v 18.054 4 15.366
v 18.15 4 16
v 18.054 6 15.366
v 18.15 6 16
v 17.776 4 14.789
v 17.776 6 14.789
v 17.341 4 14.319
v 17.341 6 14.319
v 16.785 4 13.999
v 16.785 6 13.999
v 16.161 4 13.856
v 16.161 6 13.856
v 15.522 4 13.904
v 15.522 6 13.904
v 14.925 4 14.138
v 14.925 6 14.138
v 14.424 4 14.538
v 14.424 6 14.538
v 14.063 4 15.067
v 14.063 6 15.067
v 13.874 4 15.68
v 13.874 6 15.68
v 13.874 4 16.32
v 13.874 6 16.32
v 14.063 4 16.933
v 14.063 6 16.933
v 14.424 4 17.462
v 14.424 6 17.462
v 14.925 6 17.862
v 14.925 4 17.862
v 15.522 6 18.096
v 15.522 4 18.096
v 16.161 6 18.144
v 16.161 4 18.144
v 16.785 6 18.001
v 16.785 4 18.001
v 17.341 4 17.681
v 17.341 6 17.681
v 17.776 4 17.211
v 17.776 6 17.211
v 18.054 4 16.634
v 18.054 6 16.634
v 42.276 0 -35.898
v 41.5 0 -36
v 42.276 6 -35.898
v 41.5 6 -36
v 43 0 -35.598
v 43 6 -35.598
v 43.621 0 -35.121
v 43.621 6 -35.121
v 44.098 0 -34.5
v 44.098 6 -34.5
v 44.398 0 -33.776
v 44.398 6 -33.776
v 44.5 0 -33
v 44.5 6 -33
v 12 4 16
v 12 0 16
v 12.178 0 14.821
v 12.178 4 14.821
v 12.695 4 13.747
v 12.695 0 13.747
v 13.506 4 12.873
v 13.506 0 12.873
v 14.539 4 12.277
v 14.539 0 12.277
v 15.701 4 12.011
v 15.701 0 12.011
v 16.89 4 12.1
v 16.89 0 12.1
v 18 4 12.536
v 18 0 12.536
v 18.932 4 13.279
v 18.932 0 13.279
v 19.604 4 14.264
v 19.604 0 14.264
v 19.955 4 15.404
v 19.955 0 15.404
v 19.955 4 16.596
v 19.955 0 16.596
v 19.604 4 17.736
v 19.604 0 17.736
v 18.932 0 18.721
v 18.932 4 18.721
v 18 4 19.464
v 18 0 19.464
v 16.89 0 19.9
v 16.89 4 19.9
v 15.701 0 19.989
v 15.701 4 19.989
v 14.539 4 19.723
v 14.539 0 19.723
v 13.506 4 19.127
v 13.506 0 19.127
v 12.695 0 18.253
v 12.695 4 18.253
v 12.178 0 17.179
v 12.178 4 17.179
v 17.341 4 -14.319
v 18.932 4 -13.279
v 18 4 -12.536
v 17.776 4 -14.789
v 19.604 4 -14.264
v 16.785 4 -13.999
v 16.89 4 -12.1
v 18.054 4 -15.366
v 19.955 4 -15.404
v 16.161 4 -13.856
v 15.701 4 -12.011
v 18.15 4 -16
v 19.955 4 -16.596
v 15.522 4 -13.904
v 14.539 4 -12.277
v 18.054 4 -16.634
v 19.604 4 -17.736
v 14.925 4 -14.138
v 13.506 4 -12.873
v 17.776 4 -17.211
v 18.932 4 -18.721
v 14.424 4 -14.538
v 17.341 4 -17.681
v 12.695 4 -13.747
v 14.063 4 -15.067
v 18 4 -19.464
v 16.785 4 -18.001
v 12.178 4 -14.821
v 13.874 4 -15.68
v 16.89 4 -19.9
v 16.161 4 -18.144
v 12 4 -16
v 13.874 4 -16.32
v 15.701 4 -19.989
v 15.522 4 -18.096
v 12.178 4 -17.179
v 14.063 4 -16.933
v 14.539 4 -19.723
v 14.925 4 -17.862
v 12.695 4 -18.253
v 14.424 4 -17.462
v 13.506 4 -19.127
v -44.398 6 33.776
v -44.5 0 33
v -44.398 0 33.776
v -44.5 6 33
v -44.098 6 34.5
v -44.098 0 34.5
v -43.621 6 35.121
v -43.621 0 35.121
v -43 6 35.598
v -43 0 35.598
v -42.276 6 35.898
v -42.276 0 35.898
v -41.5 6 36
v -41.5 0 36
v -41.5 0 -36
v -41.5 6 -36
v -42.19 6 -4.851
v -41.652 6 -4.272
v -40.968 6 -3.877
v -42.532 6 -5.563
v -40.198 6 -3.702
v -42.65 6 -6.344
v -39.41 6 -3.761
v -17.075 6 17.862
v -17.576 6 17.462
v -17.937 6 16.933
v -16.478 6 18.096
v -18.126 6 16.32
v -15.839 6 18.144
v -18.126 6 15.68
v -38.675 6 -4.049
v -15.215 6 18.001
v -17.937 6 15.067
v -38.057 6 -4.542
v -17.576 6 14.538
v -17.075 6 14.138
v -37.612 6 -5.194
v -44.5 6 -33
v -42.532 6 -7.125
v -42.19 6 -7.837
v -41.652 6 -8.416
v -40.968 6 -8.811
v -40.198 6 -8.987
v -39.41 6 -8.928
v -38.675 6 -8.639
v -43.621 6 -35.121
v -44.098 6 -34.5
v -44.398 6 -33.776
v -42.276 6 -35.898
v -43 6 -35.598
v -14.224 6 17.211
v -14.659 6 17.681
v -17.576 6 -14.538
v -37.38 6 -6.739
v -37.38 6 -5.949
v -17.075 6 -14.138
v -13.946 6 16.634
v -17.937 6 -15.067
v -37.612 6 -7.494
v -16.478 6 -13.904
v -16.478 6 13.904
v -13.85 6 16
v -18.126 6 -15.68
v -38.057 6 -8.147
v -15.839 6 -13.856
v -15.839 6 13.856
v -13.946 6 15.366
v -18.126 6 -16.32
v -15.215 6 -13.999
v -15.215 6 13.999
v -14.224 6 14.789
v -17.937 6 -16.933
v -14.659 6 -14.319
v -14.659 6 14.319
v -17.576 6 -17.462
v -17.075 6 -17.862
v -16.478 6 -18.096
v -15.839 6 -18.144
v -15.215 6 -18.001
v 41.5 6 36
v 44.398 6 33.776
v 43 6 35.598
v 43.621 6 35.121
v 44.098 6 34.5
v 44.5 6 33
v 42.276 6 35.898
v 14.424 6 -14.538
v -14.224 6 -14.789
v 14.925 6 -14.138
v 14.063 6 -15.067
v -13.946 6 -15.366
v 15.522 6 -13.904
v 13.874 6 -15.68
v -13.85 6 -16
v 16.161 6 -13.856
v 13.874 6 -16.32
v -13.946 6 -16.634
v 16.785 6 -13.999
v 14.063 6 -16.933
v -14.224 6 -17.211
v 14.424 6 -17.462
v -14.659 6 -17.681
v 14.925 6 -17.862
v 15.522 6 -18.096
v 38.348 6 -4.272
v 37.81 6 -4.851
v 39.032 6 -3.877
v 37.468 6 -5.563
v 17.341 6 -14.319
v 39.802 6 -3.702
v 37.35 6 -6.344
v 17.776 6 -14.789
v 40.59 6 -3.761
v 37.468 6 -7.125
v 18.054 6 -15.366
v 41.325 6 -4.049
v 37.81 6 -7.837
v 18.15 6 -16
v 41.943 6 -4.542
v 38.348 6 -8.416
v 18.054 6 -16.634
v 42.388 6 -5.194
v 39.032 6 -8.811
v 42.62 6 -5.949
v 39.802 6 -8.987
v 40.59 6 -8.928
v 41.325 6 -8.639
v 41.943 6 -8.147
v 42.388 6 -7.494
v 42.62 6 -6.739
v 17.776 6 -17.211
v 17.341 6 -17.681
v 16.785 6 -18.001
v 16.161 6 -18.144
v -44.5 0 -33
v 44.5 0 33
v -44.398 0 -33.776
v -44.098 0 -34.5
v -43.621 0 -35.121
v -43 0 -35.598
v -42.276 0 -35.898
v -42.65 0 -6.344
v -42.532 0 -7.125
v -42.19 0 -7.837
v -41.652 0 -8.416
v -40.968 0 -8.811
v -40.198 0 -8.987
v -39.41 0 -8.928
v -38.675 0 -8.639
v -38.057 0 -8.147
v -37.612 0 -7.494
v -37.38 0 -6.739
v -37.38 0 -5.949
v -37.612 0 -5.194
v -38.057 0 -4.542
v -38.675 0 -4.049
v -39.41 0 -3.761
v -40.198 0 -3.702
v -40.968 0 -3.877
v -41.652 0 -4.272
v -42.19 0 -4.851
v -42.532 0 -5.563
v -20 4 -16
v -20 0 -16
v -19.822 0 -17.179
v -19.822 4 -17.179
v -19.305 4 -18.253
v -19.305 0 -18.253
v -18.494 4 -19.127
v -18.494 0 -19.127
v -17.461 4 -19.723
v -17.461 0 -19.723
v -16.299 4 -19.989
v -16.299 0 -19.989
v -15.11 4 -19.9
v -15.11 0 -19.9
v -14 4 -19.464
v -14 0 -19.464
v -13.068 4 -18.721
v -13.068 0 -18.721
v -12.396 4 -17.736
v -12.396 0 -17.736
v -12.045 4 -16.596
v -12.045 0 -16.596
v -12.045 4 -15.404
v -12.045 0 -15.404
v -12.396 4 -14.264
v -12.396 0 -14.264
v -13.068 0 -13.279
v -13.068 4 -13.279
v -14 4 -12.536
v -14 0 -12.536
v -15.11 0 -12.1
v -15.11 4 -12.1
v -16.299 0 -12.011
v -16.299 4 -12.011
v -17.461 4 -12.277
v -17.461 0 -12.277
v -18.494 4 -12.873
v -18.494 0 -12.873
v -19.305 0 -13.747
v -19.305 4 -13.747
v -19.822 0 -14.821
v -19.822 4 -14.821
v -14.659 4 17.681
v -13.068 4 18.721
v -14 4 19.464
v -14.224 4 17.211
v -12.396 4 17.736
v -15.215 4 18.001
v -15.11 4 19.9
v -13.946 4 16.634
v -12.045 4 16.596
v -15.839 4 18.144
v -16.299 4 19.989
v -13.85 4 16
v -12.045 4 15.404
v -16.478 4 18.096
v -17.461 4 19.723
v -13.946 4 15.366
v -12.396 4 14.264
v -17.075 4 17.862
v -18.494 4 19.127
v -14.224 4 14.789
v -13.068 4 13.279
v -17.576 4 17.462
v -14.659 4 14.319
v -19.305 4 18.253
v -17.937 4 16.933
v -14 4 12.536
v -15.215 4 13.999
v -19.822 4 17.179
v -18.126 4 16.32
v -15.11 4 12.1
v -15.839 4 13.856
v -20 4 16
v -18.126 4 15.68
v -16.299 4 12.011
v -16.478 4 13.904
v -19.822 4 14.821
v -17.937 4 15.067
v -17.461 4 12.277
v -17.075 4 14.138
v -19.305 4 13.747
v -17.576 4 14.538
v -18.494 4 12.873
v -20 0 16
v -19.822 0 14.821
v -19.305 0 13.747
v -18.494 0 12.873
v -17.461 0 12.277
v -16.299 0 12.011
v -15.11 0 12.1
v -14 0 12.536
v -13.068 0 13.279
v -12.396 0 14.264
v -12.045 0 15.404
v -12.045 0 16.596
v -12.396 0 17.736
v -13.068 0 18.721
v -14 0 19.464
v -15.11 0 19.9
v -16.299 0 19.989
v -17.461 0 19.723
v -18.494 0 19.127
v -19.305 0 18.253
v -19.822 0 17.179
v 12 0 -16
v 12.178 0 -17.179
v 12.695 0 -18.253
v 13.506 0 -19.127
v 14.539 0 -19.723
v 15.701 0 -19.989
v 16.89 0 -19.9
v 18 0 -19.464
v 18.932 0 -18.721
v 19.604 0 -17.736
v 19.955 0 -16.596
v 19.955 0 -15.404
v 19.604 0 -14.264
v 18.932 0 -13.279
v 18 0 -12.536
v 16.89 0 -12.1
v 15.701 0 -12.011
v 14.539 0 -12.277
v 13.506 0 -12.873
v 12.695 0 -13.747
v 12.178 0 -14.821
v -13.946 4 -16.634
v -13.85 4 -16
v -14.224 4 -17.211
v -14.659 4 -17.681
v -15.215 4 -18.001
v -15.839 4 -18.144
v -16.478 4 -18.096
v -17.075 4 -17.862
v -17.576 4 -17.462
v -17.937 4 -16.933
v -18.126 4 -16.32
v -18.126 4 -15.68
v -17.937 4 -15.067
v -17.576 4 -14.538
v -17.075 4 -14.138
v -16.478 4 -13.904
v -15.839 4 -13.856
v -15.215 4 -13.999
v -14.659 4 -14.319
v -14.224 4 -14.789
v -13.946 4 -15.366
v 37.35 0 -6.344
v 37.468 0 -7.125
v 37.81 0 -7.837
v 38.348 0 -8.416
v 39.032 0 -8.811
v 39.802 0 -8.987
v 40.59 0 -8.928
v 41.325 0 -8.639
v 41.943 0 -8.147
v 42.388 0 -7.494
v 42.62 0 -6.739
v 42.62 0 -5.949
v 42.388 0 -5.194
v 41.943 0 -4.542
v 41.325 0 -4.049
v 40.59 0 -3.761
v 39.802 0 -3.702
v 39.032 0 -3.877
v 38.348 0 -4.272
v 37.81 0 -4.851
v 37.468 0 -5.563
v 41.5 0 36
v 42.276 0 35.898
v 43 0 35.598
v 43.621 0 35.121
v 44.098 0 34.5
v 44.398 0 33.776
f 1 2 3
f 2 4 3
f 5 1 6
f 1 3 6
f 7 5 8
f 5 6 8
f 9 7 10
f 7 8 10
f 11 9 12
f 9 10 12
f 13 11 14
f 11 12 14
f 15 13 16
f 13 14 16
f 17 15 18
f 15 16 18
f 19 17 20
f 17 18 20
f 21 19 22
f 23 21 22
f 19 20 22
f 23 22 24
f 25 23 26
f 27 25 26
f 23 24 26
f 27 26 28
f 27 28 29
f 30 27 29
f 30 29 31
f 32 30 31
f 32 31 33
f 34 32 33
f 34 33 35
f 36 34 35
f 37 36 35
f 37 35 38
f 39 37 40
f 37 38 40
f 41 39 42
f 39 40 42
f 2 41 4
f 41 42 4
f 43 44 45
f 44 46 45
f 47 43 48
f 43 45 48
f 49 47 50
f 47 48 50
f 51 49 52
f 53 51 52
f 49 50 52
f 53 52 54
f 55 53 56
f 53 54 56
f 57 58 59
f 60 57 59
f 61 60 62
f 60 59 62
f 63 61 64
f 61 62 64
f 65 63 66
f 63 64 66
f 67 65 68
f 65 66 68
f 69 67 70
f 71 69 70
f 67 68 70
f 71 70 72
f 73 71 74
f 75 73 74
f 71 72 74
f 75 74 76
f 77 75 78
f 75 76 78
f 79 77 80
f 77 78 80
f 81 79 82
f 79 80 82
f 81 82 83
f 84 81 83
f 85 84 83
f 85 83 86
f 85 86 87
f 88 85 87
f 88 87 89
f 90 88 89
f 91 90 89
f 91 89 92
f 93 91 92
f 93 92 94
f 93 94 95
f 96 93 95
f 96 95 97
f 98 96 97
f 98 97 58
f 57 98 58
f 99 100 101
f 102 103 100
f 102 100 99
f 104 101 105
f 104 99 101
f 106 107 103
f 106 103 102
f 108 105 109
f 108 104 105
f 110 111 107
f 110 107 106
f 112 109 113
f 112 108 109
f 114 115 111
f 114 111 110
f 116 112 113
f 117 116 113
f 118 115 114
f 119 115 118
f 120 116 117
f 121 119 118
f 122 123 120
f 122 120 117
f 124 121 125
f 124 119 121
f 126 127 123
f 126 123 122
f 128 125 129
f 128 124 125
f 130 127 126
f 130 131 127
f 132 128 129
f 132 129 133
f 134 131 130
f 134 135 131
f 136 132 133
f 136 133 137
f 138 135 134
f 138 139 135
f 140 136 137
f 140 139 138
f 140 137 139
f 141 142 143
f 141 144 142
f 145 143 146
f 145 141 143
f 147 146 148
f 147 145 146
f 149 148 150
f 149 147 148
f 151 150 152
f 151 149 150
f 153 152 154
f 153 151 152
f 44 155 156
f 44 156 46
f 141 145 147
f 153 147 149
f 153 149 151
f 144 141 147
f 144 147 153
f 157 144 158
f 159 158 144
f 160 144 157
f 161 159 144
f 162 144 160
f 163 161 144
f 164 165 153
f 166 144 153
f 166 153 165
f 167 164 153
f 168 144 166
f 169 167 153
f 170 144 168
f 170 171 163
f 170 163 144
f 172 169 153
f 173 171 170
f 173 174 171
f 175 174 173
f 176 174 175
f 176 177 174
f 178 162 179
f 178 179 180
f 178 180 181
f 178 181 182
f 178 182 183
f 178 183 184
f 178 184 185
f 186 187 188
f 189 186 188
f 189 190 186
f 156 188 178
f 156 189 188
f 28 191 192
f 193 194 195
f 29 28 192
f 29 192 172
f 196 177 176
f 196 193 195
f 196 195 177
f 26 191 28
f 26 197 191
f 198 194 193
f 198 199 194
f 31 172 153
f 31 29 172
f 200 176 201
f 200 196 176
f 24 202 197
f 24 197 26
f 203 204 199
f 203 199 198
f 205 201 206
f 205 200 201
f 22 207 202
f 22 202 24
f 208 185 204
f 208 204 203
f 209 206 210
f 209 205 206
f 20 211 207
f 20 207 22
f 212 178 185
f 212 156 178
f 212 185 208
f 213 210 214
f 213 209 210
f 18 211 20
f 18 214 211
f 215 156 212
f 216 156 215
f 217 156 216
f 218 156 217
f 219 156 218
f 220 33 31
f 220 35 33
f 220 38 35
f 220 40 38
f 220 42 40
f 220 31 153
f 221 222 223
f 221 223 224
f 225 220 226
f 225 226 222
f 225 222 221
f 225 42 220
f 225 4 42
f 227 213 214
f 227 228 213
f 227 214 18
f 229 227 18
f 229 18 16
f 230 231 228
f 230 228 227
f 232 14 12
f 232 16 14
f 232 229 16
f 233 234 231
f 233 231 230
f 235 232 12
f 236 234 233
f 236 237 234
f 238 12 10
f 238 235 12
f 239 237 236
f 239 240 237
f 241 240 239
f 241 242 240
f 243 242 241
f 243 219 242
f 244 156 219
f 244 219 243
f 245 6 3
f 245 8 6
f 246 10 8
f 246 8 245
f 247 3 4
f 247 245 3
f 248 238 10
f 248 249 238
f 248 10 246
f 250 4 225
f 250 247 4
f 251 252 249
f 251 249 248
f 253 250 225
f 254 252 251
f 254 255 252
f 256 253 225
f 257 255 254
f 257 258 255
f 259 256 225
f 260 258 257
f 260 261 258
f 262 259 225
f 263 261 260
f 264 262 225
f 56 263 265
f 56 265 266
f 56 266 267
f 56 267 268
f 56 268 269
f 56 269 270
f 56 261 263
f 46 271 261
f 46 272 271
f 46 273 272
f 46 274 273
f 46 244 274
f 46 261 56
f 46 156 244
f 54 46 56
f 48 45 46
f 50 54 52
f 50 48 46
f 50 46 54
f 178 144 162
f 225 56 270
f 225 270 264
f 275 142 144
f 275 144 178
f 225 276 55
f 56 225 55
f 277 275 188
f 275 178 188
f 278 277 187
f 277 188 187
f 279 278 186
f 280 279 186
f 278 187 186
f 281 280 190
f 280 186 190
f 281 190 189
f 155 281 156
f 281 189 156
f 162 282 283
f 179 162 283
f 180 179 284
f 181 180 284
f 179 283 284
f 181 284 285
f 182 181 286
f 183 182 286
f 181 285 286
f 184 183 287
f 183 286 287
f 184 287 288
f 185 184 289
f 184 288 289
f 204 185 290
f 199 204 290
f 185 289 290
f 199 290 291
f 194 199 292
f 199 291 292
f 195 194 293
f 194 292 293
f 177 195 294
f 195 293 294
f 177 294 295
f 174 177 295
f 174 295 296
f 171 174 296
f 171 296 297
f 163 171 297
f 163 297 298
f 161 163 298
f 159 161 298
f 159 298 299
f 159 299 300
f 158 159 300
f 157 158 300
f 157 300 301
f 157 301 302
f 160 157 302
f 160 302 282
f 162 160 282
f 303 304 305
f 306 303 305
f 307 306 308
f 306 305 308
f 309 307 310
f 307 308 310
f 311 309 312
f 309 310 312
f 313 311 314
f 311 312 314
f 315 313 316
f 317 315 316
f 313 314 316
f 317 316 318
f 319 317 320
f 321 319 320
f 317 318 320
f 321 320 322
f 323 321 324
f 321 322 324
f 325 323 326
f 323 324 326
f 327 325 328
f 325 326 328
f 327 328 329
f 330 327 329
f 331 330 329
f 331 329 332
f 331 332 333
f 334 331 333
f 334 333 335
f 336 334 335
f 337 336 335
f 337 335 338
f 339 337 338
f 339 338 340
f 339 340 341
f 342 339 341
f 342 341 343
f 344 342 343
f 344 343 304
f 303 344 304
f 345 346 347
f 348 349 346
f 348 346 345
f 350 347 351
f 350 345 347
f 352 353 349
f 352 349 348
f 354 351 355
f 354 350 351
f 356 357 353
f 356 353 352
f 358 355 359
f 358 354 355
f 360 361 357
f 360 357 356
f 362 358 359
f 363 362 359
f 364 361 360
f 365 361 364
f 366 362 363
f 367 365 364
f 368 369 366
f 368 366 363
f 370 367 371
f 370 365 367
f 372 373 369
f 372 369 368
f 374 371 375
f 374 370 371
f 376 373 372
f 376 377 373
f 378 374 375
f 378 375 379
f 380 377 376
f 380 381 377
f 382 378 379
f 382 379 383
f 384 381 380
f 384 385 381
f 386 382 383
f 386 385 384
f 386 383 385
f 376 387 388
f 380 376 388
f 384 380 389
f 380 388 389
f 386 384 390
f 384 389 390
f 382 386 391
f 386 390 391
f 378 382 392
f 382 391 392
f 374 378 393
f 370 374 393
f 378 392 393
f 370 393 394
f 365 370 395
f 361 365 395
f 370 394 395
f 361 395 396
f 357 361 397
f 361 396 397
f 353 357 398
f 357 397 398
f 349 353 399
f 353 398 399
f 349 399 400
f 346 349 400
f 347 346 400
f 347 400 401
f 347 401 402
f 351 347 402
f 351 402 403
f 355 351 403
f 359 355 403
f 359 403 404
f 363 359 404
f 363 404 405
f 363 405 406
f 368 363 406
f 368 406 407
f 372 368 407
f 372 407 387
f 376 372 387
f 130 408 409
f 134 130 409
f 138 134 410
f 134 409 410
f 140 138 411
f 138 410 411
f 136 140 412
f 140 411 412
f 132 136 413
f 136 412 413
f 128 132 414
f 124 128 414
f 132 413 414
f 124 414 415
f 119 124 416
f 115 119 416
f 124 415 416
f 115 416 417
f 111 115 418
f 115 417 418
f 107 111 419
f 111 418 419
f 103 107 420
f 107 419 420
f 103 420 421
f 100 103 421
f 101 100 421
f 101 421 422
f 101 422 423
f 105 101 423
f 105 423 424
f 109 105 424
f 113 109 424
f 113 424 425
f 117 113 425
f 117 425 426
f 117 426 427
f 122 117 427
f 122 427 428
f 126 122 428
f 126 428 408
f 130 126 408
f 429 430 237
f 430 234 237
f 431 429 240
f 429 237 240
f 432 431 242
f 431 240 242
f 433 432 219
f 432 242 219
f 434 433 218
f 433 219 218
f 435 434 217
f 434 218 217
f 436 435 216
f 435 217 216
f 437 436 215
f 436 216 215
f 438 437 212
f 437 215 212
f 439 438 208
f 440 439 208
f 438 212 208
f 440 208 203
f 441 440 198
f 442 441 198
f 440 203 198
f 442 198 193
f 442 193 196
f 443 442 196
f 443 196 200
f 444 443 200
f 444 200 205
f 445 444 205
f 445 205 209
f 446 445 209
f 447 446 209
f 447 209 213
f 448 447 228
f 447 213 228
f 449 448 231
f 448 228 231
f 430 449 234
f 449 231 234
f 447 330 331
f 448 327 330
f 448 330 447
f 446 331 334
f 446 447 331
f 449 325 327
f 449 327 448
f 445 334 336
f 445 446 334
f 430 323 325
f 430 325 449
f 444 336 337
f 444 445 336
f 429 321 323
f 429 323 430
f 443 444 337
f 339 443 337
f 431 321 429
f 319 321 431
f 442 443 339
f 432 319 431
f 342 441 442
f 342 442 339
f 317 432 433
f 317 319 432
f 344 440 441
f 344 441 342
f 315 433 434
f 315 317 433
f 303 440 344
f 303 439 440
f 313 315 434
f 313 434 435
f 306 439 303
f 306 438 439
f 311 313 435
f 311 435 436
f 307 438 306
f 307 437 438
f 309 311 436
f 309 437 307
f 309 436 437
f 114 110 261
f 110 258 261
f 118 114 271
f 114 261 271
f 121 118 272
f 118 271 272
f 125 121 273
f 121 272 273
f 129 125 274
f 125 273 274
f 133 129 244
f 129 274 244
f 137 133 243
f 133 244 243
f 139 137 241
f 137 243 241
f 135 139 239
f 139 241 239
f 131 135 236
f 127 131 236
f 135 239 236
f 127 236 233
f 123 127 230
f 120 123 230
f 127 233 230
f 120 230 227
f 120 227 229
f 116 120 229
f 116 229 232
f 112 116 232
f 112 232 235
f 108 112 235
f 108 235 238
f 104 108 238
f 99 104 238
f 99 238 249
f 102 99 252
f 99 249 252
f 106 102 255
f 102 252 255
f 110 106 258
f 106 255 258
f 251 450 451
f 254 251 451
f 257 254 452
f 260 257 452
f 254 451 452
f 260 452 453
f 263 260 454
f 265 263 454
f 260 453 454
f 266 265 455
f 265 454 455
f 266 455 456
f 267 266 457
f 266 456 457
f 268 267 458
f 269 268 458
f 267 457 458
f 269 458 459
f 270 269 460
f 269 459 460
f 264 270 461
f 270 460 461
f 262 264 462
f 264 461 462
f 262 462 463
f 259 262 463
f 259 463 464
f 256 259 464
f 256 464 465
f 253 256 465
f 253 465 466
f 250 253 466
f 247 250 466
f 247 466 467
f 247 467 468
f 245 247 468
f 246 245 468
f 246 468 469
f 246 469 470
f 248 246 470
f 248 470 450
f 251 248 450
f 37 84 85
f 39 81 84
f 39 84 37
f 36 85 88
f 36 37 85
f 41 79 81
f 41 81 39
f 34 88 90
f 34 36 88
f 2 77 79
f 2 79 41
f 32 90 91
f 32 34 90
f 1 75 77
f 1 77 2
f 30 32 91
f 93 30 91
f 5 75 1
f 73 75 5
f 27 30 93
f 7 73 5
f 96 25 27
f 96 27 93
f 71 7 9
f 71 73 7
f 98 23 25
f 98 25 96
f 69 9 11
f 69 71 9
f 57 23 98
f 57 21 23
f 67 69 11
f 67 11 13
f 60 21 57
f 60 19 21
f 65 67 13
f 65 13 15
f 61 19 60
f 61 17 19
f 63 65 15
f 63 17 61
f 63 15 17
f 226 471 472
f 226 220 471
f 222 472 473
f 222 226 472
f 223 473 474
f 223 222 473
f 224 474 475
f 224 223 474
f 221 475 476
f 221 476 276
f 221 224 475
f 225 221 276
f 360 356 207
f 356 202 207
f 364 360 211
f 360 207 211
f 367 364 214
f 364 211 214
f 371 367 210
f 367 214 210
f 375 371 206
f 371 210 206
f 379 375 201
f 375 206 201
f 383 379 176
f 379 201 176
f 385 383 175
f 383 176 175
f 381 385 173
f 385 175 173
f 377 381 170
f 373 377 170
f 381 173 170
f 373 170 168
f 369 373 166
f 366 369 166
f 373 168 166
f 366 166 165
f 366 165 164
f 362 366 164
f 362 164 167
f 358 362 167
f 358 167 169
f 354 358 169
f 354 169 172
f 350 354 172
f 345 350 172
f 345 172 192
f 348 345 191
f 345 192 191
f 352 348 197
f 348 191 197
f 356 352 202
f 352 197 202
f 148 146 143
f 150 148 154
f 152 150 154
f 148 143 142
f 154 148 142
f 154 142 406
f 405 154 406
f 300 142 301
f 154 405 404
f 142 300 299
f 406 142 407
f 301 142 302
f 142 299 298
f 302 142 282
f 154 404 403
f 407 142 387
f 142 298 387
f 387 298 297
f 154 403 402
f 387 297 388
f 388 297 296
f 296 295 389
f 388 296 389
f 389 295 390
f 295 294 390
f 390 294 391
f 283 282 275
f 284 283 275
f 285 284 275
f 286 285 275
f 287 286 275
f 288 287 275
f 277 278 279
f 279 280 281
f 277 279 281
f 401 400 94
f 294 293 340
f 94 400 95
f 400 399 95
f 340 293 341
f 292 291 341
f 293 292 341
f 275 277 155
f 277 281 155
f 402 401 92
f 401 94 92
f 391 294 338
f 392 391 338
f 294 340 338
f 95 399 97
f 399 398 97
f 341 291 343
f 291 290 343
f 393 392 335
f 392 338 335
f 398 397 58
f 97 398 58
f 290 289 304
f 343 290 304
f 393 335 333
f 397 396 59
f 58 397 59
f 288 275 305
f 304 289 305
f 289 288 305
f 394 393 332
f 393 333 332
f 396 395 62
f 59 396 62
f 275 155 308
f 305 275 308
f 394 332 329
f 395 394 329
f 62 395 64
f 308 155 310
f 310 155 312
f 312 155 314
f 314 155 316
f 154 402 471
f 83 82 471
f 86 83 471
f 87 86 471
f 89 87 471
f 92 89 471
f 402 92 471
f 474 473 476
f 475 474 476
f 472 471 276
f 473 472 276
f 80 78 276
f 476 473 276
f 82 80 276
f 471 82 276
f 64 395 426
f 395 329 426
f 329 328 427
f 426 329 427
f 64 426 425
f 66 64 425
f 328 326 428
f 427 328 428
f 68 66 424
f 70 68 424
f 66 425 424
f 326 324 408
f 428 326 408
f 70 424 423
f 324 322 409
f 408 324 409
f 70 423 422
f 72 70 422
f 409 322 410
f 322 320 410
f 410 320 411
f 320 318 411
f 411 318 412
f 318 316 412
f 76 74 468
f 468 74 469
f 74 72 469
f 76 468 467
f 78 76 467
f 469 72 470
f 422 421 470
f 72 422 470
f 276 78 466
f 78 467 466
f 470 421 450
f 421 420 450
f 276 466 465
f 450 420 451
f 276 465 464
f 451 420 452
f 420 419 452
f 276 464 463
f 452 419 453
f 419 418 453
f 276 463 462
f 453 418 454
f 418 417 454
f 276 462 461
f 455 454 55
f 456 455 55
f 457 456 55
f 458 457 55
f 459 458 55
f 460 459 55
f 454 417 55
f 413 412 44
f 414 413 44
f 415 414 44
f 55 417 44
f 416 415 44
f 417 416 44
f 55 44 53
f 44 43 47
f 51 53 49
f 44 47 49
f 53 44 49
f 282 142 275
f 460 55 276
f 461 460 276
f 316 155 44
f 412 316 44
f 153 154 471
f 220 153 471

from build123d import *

# Parameters (mm, degrees)
SKETCH2_W                      = 89
SKETCH2_H                      = 72
BOSS_EXTRUDE1_DEPTH            = 6
CBORE_FOR_M4_SHCS1_D           = 4.3
CBORE_FOR_M4_SHCS1_CBORE_D     = 8
CBORE_FOR_M4_SHCS1_CBORE_DEPTH = 4
M5_CLEARANCE_HOLE1_D           = 5.3
FILLET1_R                      = 3


with BuildPart() as part:
    # Sketch2 → Boss-Extrude1 (new body)
    with BuildSketch(Plane(origin=(0, 0, 0), x_dir=(1, 0, 0), z_dir=(0, 1, 0))):
        Rectangle(SKETCH2_W, SKETCH2_H)
    extrude(amount=BOSS_EXTRUDE1_DEPTH)

    # CBORE for M4 SHCS1 (through all)
    with Locations(Plane(origin=(0, 0, 0), x_dir=(-1, 0, 0), z_dir=(0, -1, 0))):
        with Locations((-16, -16), (-16, 16), (16, 16), (16, -16)):
            CounterBoreHole(CBORE_FOR_M4_SHCS1_D / 2, CBORE_FOR_M4_SHCS1_CBORE_D / 2, CBORE_FOR_M4_SHCS1_CBORE_DEPTH)

    # M5 Clearance Hole1 (through all)
    with Locations(Plane(origin=(0, 6, 0), x_dir=(1, 0, 0), z_dir=(0, 1, 0))):
        with Locations((-40, 6.34428877), (40, 6.34428877)):
            Hole(M5_CLEARANCE_HOLE1_D / 2)

    # Fillet1
    fillet1_edges = [part.edges().sort_by_distance(p)[0] for p in [
        (-44.5, 3, -36),
        (44.5, 3, -36),
        (44.5, 3, 36),
        (-44.5, 3, 36),
    ]]
    fillet(fillet1_edges, radius=FILLET1_R)


solid = part.part
